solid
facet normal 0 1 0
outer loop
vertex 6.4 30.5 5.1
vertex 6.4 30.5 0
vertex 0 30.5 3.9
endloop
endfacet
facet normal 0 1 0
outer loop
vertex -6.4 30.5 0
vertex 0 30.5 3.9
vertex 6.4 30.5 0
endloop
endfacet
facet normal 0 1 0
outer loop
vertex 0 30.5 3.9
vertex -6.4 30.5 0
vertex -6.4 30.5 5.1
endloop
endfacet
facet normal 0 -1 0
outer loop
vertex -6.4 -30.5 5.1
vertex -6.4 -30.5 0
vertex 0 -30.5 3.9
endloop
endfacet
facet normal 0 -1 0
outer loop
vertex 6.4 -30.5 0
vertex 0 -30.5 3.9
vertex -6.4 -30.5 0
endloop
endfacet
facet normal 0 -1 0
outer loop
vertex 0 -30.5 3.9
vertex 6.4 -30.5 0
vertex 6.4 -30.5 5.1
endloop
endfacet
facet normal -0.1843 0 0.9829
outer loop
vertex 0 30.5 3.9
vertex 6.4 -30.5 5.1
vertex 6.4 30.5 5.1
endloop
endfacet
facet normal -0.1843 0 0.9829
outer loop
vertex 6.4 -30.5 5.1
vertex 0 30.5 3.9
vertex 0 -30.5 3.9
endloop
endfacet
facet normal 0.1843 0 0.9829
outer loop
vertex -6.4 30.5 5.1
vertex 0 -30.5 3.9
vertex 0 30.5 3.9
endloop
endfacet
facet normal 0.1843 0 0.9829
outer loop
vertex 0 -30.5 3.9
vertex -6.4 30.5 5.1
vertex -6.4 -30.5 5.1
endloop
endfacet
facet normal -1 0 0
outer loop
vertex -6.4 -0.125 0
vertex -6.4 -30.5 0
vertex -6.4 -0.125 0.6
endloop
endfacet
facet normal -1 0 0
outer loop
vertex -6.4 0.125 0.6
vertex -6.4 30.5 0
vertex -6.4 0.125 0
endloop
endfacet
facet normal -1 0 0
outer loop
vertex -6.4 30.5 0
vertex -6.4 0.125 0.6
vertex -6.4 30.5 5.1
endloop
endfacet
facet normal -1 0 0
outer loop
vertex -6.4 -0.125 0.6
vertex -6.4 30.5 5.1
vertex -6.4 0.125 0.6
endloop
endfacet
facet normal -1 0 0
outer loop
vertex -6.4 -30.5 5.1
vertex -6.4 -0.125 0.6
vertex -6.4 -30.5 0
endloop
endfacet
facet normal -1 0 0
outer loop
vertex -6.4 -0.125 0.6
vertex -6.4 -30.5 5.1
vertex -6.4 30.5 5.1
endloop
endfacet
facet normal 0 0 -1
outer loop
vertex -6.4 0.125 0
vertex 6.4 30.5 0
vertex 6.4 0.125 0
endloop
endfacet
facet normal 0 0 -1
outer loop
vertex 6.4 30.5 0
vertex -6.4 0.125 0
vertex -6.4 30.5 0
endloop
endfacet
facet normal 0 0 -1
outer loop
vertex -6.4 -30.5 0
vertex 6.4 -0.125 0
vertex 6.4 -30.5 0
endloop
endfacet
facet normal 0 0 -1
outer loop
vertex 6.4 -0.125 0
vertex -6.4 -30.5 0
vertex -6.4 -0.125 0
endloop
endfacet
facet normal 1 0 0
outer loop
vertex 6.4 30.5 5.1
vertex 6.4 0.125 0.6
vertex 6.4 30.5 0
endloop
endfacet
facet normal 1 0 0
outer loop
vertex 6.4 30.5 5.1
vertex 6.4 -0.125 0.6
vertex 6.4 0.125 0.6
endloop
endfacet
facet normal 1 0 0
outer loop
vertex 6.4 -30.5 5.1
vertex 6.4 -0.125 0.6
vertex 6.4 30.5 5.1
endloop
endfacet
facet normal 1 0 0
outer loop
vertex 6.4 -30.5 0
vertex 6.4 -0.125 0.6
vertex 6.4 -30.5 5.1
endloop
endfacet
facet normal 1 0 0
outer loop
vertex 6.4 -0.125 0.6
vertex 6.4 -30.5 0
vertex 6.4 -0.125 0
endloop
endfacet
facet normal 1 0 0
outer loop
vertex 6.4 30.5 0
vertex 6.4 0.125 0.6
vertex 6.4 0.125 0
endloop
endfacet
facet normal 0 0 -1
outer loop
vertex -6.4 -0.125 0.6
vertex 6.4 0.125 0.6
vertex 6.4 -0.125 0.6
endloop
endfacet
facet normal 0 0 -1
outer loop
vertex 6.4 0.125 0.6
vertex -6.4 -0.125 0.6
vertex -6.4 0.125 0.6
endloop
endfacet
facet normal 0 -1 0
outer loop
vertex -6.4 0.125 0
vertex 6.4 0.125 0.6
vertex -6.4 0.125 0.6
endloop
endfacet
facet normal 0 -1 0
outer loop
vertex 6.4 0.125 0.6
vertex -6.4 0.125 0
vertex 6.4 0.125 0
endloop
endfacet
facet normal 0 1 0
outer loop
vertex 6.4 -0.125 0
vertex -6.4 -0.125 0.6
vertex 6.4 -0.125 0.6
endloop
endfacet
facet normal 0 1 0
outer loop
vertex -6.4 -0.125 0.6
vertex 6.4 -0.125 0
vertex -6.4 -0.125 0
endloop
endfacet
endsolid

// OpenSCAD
$fn=96;

L = 61.0;
W = 12.8;
H = 5.1;

end_len = 7.0;
end_step = 0.6;

seam_w = 1.2;
seam_step = 0.25;

sag = 1.2;

module v_saddle_bar(len=L, wid=W, height=H, sag_amt=sag) {
    linear_extrude(height=len, center=true, convexity=10, scale=1)
        polygon(points=[
            [-wid/2, 0],
            [-wid/2, height],
            [0, height - sag_amt],
            [wid/2, height],
            [wid/2, 0]
        ]);
}

module end_step_cut(len=L, wid=W, step_h=end_step, step_len=end_len) {
    union() {
        translate([0, 0,  len/2 - step_len/2])
            cube([wid+0.6, step_h, step_len], center=true);
        translate([0, 0, -len/2 + step_len/2])
            cube([wid+0.6, step_h, step_len], center=true);
    }
}

module seam_cut(len=L, wid=W, step_h=seam_step, seam_width=seam_w) {
    translate([0, 0, 0])
        cube([wid+0.6, step_h, seam_width], center=true);
}

difference() {
    rotate([90,0,0])
        v_saddle_bar();
    end_step_cut();
    seam_cut();
}
